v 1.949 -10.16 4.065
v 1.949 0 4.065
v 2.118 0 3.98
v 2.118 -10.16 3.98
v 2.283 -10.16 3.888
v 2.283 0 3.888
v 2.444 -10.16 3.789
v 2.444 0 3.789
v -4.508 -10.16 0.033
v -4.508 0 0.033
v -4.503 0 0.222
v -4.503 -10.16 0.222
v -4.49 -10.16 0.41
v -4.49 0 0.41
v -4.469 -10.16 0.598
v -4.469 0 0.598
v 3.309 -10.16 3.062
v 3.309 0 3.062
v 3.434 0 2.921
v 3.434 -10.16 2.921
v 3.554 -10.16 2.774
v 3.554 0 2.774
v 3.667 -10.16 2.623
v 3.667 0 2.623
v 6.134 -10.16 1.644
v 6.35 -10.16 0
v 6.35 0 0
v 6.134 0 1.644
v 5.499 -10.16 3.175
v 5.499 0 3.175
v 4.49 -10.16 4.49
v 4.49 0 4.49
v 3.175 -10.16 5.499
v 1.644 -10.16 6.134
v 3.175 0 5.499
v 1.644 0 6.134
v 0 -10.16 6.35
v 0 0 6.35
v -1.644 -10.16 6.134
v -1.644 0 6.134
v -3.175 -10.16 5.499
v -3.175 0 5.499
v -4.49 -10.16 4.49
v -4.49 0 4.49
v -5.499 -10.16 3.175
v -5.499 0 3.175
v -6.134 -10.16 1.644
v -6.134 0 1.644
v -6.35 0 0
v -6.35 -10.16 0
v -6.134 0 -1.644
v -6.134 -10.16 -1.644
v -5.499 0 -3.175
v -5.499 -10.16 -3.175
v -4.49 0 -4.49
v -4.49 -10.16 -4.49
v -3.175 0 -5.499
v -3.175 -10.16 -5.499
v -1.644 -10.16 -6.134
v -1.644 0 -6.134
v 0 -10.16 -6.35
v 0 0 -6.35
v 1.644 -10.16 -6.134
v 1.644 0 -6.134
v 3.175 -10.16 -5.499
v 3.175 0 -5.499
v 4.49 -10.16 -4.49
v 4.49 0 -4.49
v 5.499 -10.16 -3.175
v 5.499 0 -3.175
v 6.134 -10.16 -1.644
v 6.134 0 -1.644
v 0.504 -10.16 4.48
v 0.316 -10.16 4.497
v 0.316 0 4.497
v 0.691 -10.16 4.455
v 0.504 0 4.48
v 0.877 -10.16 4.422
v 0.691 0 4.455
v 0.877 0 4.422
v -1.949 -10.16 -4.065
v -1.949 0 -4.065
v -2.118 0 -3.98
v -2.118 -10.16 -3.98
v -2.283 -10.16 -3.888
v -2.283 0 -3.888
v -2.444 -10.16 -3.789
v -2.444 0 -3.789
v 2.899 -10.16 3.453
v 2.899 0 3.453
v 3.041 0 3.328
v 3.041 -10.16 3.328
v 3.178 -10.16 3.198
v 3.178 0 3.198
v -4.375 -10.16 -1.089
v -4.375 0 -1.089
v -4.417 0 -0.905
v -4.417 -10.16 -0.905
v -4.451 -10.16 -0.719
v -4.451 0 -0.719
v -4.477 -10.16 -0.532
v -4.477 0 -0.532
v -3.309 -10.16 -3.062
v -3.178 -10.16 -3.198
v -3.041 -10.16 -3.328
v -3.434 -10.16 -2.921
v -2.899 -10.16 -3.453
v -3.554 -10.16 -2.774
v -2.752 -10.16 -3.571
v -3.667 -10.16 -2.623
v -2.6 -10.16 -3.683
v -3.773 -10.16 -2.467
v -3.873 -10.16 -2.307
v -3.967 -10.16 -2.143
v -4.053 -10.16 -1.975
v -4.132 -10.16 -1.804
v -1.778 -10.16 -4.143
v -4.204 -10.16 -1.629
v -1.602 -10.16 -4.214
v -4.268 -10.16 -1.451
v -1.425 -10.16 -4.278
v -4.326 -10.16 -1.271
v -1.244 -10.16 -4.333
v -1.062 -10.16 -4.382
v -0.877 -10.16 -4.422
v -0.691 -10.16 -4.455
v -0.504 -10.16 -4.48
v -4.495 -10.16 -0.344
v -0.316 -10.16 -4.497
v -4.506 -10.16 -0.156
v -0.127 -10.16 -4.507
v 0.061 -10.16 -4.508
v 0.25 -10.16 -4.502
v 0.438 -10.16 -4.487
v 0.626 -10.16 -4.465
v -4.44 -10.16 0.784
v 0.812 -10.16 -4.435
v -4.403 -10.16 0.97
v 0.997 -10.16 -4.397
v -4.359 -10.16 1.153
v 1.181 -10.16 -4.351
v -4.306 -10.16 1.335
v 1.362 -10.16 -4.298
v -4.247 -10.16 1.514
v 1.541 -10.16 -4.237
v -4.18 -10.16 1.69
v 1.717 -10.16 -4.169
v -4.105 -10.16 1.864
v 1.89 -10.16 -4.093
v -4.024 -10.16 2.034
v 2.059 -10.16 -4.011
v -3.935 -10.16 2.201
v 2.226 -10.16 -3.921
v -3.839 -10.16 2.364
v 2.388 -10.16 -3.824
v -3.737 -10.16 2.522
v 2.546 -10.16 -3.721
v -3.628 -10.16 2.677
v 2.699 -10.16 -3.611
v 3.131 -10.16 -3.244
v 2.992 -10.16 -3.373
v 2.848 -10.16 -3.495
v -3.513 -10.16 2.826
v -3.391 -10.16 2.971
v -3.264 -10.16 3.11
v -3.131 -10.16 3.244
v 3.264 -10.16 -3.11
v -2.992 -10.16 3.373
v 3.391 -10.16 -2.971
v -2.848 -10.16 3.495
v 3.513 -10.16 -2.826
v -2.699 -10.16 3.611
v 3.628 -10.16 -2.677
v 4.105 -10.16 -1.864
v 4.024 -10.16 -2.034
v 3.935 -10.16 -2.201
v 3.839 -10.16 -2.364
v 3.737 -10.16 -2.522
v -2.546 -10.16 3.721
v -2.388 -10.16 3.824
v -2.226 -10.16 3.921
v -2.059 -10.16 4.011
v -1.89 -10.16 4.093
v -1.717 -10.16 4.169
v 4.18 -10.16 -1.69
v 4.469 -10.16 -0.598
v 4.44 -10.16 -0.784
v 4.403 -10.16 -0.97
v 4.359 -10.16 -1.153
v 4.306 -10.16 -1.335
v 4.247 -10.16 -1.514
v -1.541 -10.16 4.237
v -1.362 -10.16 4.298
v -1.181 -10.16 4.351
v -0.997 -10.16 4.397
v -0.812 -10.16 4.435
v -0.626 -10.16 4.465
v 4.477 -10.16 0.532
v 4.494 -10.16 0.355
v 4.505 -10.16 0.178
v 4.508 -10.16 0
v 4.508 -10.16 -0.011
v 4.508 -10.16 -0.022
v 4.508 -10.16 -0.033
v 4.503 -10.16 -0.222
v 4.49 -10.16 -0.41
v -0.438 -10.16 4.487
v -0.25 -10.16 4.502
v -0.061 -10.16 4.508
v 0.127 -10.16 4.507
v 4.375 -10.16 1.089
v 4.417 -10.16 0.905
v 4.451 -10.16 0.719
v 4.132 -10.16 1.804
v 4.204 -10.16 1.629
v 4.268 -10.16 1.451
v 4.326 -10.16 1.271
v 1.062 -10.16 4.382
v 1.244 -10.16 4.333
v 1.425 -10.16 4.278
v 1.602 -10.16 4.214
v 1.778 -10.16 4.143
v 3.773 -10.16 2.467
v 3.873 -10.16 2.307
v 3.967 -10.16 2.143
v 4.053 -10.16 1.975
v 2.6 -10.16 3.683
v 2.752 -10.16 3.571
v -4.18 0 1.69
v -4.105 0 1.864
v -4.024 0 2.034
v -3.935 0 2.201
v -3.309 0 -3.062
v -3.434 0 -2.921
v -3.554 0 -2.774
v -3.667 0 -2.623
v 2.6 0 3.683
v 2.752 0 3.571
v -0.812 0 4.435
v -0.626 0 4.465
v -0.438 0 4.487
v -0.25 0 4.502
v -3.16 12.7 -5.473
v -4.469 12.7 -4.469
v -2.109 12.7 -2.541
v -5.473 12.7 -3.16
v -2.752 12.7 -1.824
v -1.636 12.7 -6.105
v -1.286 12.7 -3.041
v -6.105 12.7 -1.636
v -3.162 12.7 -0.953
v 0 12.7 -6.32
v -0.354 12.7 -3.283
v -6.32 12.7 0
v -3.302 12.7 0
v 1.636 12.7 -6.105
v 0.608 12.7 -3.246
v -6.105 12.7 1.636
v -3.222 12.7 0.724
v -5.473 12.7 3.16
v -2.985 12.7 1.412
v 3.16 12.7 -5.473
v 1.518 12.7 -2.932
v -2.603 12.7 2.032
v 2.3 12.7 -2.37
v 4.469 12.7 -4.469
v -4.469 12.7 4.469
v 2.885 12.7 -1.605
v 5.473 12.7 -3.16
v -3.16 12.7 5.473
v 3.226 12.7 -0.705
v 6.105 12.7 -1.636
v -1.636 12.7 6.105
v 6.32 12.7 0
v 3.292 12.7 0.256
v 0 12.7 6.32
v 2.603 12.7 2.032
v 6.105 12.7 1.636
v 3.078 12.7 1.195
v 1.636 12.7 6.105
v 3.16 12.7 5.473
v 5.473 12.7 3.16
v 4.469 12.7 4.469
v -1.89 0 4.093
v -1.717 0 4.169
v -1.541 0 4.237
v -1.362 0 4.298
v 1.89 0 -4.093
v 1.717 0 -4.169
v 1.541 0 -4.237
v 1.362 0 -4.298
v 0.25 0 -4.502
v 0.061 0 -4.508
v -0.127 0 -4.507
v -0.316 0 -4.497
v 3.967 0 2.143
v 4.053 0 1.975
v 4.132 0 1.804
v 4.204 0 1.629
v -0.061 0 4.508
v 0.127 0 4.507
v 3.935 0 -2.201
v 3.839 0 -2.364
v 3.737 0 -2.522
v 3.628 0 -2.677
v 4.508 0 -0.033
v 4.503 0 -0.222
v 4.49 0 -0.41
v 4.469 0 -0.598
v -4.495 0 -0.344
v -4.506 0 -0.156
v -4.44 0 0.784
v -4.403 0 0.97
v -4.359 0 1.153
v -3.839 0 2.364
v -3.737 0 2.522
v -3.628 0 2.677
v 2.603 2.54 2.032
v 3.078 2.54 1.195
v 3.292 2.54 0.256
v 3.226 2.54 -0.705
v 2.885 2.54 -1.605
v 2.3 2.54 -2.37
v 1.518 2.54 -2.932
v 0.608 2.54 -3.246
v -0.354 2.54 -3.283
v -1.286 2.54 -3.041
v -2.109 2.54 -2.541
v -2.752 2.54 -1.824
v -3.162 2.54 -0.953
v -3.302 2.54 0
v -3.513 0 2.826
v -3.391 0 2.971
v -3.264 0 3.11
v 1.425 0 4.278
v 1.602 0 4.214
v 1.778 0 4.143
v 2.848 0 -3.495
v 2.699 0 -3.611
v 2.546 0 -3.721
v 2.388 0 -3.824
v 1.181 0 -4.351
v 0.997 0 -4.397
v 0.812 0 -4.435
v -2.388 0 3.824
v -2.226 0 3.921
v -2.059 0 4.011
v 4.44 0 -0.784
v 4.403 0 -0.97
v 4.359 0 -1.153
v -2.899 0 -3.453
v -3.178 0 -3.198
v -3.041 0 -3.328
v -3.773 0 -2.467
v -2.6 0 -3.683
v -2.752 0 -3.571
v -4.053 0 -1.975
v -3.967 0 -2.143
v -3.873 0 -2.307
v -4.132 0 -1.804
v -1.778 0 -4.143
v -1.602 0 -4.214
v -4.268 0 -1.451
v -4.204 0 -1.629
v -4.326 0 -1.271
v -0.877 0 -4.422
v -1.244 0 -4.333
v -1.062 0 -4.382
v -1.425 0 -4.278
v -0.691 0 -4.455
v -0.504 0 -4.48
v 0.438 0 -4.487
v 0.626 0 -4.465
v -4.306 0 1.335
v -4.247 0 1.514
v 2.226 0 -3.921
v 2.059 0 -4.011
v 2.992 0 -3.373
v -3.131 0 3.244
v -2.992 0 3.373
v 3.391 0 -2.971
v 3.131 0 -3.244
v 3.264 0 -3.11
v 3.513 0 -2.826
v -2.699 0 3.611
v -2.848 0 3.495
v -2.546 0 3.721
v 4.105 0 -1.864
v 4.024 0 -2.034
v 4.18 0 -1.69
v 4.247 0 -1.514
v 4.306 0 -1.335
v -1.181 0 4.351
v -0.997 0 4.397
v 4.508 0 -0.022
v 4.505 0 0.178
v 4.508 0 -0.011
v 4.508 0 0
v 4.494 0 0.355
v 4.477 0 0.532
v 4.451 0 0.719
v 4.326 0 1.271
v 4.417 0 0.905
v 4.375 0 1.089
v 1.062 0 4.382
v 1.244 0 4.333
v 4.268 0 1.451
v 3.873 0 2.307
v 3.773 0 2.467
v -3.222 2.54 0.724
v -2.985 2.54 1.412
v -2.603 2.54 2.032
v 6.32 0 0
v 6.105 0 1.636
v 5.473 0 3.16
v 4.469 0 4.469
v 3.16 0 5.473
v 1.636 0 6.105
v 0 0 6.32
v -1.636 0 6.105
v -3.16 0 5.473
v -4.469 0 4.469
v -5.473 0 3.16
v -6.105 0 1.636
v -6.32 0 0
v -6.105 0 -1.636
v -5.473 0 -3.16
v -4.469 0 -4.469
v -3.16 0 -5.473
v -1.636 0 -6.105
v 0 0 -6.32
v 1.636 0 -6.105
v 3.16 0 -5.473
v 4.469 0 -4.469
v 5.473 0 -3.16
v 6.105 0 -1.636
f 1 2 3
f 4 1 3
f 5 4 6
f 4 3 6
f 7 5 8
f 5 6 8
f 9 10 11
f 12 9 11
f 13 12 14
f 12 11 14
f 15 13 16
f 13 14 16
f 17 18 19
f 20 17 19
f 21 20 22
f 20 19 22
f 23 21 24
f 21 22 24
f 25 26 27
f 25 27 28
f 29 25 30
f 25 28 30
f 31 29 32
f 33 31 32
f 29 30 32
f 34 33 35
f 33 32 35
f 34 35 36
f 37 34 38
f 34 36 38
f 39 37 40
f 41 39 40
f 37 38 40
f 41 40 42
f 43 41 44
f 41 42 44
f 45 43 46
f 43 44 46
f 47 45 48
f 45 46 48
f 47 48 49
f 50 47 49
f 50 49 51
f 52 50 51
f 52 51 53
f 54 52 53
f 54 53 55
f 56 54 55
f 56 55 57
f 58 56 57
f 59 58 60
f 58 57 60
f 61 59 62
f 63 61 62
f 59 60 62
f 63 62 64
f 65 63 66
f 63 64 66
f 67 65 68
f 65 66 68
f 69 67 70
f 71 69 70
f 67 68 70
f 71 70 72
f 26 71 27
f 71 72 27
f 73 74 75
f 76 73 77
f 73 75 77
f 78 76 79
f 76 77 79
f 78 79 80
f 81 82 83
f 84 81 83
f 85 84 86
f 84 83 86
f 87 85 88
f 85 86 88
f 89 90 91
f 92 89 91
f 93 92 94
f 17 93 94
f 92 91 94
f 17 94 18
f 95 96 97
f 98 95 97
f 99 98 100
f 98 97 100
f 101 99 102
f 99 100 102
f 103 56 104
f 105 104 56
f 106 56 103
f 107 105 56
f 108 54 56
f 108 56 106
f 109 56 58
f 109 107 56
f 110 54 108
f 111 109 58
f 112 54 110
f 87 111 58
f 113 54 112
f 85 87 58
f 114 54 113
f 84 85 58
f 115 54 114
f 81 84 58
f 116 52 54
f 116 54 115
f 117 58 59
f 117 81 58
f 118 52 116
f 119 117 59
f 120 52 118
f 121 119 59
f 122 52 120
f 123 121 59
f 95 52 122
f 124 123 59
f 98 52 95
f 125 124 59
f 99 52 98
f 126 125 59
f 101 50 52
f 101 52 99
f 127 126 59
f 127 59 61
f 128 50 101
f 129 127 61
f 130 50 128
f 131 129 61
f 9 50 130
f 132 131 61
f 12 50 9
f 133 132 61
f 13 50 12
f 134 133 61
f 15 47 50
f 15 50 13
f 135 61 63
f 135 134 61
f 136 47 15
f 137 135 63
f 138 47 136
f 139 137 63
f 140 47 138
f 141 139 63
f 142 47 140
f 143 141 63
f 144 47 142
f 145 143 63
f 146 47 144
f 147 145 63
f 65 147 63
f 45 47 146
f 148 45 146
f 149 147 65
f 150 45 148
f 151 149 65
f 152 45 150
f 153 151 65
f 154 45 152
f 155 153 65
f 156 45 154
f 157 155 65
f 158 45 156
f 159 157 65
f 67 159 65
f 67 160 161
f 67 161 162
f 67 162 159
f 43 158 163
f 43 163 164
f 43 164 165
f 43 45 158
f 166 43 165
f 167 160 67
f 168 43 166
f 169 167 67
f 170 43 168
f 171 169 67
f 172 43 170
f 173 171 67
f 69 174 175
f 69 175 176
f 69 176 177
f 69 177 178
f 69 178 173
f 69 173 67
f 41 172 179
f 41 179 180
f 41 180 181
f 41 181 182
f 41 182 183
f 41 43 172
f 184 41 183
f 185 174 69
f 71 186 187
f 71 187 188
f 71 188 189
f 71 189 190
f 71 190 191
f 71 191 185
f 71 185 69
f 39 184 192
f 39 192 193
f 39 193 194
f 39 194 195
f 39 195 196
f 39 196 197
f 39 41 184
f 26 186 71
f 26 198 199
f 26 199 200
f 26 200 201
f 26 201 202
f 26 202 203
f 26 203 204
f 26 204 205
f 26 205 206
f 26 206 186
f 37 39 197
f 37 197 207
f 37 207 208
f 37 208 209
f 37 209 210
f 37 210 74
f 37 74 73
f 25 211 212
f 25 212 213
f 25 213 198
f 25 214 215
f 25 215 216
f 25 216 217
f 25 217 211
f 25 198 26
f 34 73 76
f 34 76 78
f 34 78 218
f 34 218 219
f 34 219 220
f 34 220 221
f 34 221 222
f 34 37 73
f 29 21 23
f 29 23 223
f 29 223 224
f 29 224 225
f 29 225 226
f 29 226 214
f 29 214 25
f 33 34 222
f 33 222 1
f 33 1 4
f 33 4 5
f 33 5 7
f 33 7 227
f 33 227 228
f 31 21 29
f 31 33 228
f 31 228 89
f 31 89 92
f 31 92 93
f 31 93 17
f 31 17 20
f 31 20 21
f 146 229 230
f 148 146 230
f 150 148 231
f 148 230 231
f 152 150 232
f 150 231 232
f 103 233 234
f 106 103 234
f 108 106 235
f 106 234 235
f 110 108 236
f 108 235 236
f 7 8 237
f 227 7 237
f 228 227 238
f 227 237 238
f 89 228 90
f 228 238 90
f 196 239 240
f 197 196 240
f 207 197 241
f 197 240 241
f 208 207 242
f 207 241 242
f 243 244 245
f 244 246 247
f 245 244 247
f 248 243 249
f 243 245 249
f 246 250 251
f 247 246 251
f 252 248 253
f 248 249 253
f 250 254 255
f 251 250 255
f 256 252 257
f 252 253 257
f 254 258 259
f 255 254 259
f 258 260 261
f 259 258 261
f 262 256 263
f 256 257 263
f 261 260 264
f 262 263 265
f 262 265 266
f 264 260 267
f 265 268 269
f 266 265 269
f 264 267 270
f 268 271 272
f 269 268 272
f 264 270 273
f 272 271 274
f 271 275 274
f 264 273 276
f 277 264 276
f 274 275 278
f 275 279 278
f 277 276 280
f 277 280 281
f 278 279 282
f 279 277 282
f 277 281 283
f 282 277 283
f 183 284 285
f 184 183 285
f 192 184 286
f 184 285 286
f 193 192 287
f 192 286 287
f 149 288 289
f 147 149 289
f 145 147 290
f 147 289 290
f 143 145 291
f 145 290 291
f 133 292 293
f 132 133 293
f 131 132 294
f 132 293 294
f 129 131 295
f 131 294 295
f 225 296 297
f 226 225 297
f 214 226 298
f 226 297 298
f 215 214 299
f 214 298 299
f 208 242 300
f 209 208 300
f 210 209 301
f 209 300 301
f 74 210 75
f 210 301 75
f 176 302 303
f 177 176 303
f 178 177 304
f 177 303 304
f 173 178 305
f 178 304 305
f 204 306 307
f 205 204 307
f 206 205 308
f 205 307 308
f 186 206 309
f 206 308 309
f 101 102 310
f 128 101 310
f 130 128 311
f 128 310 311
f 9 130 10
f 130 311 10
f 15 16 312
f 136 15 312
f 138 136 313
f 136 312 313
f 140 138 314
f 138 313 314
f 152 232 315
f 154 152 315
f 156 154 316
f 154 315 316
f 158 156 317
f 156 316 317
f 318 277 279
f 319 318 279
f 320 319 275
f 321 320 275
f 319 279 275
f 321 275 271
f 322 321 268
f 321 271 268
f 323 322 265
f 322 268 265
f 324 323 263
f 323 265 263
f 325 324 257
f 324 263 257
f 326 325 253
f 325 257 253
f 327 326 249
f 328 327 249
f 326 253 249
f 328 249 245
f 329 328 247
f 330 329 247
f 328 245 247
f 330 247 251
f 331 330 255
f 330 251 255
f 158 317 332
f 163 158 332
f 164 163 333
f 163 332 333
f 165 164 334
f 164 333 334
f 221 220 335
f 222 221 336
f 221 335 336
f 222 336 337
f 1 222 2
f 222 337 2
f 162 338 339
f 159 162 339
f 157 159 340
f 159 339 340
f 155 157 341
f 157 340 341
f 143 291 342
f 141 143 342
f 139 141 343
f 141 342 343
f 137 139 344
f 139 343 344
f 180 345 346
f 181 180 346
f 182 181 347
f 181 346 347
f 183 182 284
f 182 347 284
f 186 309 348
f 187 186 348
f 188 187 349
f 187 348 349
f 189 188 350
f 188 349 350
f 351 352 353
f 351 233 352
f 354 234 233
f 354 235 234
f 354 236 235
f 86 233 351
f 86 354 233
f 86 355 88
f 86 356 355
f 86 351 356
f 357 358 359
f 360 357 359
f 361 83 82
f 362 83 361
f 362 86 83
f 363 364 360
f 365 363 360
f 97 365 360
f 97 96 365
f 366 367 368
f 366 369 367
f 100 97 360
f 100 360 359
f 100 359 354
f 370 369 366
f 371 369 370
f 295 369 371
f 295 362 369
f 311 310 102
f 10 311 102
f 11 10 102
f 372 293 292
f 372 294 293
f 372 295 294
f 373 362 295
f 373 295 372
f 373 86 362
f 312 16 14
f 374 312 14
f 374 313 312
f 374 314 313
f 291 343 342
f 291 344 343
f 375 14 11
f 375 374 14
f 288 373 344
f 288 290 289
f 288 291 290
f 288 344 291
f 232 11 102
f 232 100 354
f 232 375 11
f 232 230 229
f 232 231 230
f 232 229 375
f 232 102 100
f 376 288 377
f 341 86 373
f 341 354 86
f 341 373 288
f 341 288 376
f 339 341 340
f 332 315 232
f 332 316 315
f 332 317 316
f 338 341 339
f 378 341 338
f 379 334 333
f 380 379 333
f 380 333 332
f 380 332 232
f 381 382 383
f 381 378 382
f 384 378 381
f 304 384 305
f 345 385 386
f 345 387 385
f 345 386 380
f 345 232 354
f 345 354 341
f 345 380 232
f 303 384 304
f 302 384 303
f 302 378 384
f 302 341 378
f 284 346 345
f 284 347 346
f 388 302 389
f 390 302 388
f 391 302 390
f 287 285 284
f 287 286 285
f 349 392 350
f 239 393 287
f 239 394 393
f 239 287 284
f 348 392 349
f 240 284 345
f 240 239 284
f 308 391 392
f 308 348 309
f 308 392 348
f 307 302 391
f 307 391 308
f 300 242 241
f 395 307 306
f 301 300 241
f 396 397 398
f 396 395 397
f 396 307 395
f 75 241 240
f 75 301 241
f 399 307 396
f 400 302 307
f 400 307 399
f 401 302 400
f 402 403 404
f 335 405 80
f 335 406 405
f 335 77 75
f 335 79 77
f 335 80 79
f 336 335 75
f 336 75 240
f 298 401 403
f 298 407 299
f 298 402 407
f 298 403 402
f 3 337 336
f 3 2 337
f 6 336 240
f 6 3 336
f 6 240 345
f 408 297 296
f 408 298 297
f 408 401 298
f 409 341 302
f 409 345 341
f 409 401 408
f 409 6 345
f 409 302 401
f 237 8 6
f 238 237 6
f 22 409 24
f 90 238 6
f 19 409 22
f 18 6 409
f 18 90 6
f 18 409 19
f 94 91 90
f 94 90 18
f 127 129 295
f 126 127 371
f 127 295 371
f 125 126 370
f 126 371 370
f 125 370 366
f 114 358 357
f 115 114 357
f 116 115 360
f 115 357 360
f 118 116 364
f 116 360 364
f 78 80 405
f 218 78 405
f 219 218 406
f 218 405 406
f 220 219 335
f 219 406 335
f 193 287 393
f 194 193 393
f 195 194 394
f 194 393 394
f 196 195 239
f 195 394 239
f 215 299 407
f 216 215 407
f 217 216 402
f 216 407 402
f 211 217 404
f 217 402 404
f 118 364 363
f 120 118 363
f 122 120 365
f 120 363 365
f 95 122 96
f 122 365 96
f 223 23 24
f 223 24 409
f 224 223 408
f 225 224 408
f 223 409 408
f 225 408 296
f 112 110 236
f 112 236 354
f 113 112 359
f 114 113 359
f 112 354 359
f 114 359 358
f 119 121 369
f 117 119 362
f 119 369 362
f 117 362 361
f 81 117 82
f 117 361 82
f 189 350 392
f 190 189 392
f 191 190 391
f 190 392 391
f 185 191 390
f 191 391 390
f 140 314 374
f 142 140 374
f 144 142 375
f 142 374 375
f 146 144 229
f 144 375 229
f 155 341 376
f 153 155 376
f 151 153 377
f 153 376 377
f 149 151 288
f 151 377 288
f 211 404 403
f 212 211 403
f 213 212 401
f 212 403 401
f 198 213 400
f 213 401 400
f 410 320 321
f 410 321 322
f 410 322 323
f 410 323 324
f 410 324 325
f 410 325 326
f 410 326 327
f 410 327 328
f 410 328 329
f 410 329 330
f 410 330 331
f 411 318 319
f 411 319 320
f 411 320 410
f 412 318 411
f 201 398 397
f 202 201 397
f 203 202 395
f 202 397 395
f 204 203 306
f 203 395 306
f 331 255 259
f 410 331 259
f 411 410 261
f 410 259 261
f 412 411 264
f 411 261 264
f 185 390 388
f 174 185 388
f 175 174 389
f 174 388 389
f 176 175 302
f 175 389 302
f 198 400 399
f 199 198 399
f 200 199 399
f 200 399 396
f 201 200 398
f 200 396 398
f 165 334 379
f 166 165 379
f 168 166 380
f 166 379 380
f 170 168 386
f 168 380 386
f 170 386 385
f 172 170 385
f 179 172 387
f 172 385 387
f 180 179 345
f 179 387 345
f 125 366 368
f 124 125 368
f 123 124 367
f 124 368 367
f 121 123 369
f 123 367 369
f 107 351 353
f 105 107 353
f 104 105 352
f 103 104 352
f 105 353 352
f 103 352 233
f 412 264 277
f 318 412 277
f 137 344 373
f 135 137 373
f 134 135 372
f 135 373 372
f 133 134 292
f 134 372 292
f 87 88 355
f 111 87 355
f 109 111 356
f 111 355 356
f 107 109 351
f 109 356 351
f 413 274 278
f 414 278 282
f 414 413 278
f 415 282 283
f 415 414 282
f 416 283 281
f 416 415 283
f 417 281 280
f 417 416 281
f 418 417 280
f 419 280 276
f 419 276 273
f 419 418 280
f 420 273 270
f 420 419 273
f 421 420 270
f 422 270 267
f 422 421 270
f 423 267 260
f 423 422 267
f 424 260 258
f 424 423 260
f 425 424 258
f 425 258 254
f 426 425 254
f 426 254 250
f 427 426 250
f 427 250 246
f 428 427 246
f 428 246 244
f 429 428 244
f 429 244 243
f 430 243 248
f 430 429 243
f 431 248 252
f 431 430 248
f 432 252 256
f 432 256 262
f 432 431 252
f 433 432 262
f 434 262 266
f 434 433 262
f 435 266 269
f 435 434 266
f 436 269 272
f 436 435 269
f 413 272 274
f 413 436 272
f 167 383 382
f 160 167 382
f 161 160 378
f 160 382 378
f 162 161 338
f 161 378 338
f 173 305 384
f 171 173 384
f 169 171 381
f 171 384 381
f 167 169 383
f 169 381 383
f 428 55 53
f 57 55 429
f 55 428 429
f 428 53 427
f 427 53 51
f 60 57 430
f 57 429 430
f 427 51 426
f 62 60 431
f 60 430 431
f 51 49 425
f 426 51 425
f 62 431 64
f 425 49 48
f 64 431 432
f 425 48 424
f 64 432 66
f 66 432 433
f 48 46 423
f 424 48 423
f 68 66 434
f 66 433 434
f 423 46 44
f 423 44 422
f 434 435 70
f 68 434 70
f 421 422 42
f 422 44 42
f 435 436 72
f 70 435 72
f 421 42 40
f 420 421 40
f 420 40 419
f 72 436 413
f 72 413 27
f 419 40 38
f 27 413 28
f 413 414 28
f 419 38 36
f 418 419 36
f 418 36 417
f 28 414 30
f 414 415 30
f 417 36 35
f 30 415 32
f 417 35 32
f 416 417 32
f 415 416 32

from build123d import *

# Parameters (mm, degrees)
F0_R     = 6.35
F1_DEPTH = 10.16
F2_R     = 6.3201010277
F3_DEPTH = 12.7
F5_DEPTH = 10.16
F6_R     = 6.3201010277
F6_R_2   = 3.556
F7_DEPTH = 12.7


with BuildPart() as f1:
    # F0 (on Front) → F1 (new body)
    with BuildSketch(Plane.XZ):
        Circle(F0_R)
        with BuildLine():
            ThreePointArc((4.4769727705, 0.5322471811), (4.500611291, 0.2665900542), (4.5085, 0))
            ThreePointArc((4.5085, 0), (4.5084696907, -0.0165317216), (4.5083787633, -0.0330632208))
            ThreePointArc((4.5083787633, -0.0330632208), (4.4974064508, -0.3160814229), (4.4686849298, -0.597852196))
            ThreePointArc((4.4686849298, -0.597852196), (4.4223275509, -0.8772635196), (4.3585172655, -1.1532126849))
            ThreePointArc((4.3585172655, -1.1532126849), (4.2775059036, -1.4246106466), (4.1796131802, -1.6903863208))
            ThreePointArc((4.1796131802, -1.6903863208), (4.0652254331, -1.9494908126), (3.9347940983, -2.2009015547))
            ThreePointArc((3.9347940983, -2.2009015547), (3.788833929, -2.4436263439), (3.627920963, -2.6767072564))
            ThreePointArc((3.627920963, -2.6767072564), (3.4526902504, -2.8992244281), (3.2638333469, -3.1102996856))
            ThreePointArc((3.2638333469, -3.1102996856), (3.0620955841, -3.3091000111), (2.8482731291, -3.4948408307))
            ThreePointArc((2.8482731291, -3.4948408307), (2.6232098413, -3.6667891102), (2.3877939426, -3.8242662482))
            ThreePointArc((2.3877939426, -3.8242662482), (2.1429545122, -3.9666507546), (1.8896578193, -4.0933807025))
            ThreePointArc((1.8896578193, -4.0933807025), (1.6289035103, -4.203955947), (1.3617206633, -4.2979400979))
            ThreePointArc((1.3617206633, -4.2979400979), (1.089163727, -4.3749622428), (0.812308359, -4.4347184104))
            ThreePointArc((0.812308359, -4.4347184104), (0.5322471811, -4.4769727705), (0.2500854667, -4.5015585645))
            ThreePointArc((0.2500854667, -4.5015585645), (-0.0330632208, -4.5083787633), (-0.3160814229, -4.4974064508))
            ThreePointArc((-0.3160814229, -4.4974064508), (-0.597852196, -4.4686849298), (-0.8772635196, -4.4223275509))
            ThreePointArc((-0.8772635196, -4.4223275509), (-1.1532126849, -4.3585172655), (-1.4246106466, -4.2775059036))
            ThreePointArc((-1.4246106466, -4.2775059036), (-1.6903863208, -4.1796131802), (-1.9494908126, -4.0652254331))
            ThreePointArc((-1.9494908126, -4.0652254331), (-2.2009015547, -3.9347940983), (-2.4436263439, -3.788833929))
            ThreePointArc((-2.4436263439, -3.788833929), (-2.6767072564, -3.627920963), (-2.8992244281, -3.4526902504))
            ThreePointArc((-2.8992244281, -3.4526902504), (-3.1102996856, -3.2638333469), (-3.3091000111, -3.0620955841))
            ThreePointArc((-3.3091000111, -3.0620955841), (-3.4948408307, -2.8482731291), (-3.6667891102, -2.6232098413))
            ThreePointArc((-3.6667891102, -2.6232098413), (-3.8242662482, -2.3877939426), (-3.9666507546, -2.1429545122))
            ThreePointArc((-3.9666507546, -2.1429545122), (-4.0933807025, -1.8896578193), (-4.203955947, -1.6289035103))
            ThreePointArc((-4.203955947, -1.6289035103), (-4.2979400979, -1.3617206633), (-4.3749622428, -1.089163727))
            ThreePointArc((-4.3749622428, -1.089163727), (-4.4347184104, -0.812308359), (-4.4769727705, -0.5322471811))
            ThreePointArc((-4.4769727705, -0.5322471811), (-4.5015585645, -0.2500854667), (-4.5083787633, 0.0330632208))
            ThreePointArc((-4.5083787633, 0.0330632208), (-4.4974064508, 0.3160814229), (-4.4686849298, 0.597852196))
            ThreePointArc((-4.4686849298, 0.597852196), (-4.4223275509, 0.8772635196), (-4.3585172655, 1.1532126849))
            ThreePointArc((-4.3585172655, 1.1532126849), (-4.2775059036, 1.4246106466), (-4.1796131802, 1.6903863208))
            ThreePointArc((-4.1796131802, 1.6903863208), (-4.0652254331, 1.9494908126), (-3.9347940983, 2.2009015547))
            ThreePointArc((-3.9347940983, 2.2009015547), (-3.788833929, 2.4436263439), (-3.627920963, 2.6767072564))
            ThreePointArc((-3.627920963, 2.6767072564), (-3.4526902504, 2.8992244281), (-3.2638333469, 3.1102996856))
            ThreePointArc((-3.2638333469, 3.1102996856), (-3.0620955841, 3.3091000111), (-2.8482731291, 3.4948408307))
            ThreePointArc((-2.8482731291, 3.4948408307), (-2.6232098413, 3.6667891102), (-2.3877939426, 3.8242662482))
            ThreePointArc((-2.3877939426, 3.8242662482), (-2.1429545122, 3.9666507546), (-1.8896578193, 4.0933807025))
            ThreePointArc((-1.8896578193, 4.0933807025), (-1.6289035103, 4.203955947), (-1.3617206633, 4.2979400979))
            ThreePointArc((-1.3617206633, 4.2979400979), (-1.089163727, 4.3749622428), (-0.812308359, 4.4347184104))
            ThreePointArc((-0.812308359, 4.4347184104), (-0.5322471811, 4.4769727705), (-0.2500854667, 4.5015585645))
            ThreePointArc((-0.2500854667, 4.5015585645), (0.0330632208, 4.5083787633), (0.3160814229, 4.4974064508))
            ThreePointArc((0.3160814229, 4.4974064508), (0.597852196, 4.4686849298), (0.8772635196, 4.4223275509))
            ThreePointArc((0.8772635196, 4.4223275509), (1.1532126849, 4.3585172655), (1.4246106466, 4.2775059036))
            ThreePointArc((1.4246106466, 4.2775059036), (1.6903863208, 4.1796131802), (1.9494908126, 4.0652254331))
            ThreePointArc((1.9494908126, 4.0652254331), (2.2009015547, 3.9347940983), (2.4436263439, 3.788833929))
            ThreePointArc((2.4436263439, 3.788833929), (2.6767072564, 3.627920963), (2.8992244281, 3.4526902504))
            ThreePointArc((2.8992244281, 3.4526902504), (3.1102996856, 3.2638333469), (3.3091000111, 3.0620955841))
            ThreePointArc((3.3091000111, 3.0620955841), (3.4948408307, 2.8482731291), (3.6667891102, 2.6232098413))
            ThreePointArc((3.6667891102, 2.6232098413), (3.8242662482, 2.3877939426), (3.9666507546, 2.1429545122))
            ThreePointArc((3.9666507546, 2.1429545122), (4.0933807025, 1.8896578193), (4.203955947, 1.6289035103))
            ThreePointArc((4.203955947, 1.6289035103), (4.2979400979, 1.3617206633), (4.3749622428, 1.089163727))
            ThreePointArc((4.3749622428, 1.089163727), (4.4347184104, 0.812308359), (4.4769727705, 0.5322471811))
        make_face(mode=Mode.SUBTRACT)
    extrude(amount=F1_DEPTH)

    # F2 (on Front) → F3 (join)
    with BuildSketch(Plane.XZ):
        Circle(F2_R)
    extrude(amount=-F3_DEPTH)

    # F4 (on face) → F5 (cut)
    with BuildSketch(Plane(origin=(0, 12.7, 0), x_dir=(-1, 0, 0), z_dir=(0, 1, 0))):
        with BuildLine():
            ThreePointArc((-2.6027254946, 2.032), (-1.0744776445, -3.1222911125), (3.302, 0))
            ThreePointArc((3.302, 0), (3.1222911125, 1.0744776445), (2.6027254946, 2.032))
            Line((2.6027254946, 2.032), (-2.6027254946, 2.032))
        make_face()
    extrude(amount=-F5_DEPTH, mode=Mode.SUBTRACT)

    # F6 (on face) → F7 (join)
    with BuildSketch(Plane(origin=(0, 12.7, 0), x_dir=(-1, 0, 0), z_dir=(0, 1, 0))):
        Circle(F6_R)
        Circle(F6_R_2, mode=Mode.SUBTRACT)
        with BuildLine():
            Line((-2.6027254946, 2.032), (2.6027254946, 2.032))
            ThreePointArc((2.6027254946, 2.032), (0, 3.302), (-2.6027254946, 2.032))
        make_face()
    extrude(amount=-F7_DEPTH)


solid = f1.part
